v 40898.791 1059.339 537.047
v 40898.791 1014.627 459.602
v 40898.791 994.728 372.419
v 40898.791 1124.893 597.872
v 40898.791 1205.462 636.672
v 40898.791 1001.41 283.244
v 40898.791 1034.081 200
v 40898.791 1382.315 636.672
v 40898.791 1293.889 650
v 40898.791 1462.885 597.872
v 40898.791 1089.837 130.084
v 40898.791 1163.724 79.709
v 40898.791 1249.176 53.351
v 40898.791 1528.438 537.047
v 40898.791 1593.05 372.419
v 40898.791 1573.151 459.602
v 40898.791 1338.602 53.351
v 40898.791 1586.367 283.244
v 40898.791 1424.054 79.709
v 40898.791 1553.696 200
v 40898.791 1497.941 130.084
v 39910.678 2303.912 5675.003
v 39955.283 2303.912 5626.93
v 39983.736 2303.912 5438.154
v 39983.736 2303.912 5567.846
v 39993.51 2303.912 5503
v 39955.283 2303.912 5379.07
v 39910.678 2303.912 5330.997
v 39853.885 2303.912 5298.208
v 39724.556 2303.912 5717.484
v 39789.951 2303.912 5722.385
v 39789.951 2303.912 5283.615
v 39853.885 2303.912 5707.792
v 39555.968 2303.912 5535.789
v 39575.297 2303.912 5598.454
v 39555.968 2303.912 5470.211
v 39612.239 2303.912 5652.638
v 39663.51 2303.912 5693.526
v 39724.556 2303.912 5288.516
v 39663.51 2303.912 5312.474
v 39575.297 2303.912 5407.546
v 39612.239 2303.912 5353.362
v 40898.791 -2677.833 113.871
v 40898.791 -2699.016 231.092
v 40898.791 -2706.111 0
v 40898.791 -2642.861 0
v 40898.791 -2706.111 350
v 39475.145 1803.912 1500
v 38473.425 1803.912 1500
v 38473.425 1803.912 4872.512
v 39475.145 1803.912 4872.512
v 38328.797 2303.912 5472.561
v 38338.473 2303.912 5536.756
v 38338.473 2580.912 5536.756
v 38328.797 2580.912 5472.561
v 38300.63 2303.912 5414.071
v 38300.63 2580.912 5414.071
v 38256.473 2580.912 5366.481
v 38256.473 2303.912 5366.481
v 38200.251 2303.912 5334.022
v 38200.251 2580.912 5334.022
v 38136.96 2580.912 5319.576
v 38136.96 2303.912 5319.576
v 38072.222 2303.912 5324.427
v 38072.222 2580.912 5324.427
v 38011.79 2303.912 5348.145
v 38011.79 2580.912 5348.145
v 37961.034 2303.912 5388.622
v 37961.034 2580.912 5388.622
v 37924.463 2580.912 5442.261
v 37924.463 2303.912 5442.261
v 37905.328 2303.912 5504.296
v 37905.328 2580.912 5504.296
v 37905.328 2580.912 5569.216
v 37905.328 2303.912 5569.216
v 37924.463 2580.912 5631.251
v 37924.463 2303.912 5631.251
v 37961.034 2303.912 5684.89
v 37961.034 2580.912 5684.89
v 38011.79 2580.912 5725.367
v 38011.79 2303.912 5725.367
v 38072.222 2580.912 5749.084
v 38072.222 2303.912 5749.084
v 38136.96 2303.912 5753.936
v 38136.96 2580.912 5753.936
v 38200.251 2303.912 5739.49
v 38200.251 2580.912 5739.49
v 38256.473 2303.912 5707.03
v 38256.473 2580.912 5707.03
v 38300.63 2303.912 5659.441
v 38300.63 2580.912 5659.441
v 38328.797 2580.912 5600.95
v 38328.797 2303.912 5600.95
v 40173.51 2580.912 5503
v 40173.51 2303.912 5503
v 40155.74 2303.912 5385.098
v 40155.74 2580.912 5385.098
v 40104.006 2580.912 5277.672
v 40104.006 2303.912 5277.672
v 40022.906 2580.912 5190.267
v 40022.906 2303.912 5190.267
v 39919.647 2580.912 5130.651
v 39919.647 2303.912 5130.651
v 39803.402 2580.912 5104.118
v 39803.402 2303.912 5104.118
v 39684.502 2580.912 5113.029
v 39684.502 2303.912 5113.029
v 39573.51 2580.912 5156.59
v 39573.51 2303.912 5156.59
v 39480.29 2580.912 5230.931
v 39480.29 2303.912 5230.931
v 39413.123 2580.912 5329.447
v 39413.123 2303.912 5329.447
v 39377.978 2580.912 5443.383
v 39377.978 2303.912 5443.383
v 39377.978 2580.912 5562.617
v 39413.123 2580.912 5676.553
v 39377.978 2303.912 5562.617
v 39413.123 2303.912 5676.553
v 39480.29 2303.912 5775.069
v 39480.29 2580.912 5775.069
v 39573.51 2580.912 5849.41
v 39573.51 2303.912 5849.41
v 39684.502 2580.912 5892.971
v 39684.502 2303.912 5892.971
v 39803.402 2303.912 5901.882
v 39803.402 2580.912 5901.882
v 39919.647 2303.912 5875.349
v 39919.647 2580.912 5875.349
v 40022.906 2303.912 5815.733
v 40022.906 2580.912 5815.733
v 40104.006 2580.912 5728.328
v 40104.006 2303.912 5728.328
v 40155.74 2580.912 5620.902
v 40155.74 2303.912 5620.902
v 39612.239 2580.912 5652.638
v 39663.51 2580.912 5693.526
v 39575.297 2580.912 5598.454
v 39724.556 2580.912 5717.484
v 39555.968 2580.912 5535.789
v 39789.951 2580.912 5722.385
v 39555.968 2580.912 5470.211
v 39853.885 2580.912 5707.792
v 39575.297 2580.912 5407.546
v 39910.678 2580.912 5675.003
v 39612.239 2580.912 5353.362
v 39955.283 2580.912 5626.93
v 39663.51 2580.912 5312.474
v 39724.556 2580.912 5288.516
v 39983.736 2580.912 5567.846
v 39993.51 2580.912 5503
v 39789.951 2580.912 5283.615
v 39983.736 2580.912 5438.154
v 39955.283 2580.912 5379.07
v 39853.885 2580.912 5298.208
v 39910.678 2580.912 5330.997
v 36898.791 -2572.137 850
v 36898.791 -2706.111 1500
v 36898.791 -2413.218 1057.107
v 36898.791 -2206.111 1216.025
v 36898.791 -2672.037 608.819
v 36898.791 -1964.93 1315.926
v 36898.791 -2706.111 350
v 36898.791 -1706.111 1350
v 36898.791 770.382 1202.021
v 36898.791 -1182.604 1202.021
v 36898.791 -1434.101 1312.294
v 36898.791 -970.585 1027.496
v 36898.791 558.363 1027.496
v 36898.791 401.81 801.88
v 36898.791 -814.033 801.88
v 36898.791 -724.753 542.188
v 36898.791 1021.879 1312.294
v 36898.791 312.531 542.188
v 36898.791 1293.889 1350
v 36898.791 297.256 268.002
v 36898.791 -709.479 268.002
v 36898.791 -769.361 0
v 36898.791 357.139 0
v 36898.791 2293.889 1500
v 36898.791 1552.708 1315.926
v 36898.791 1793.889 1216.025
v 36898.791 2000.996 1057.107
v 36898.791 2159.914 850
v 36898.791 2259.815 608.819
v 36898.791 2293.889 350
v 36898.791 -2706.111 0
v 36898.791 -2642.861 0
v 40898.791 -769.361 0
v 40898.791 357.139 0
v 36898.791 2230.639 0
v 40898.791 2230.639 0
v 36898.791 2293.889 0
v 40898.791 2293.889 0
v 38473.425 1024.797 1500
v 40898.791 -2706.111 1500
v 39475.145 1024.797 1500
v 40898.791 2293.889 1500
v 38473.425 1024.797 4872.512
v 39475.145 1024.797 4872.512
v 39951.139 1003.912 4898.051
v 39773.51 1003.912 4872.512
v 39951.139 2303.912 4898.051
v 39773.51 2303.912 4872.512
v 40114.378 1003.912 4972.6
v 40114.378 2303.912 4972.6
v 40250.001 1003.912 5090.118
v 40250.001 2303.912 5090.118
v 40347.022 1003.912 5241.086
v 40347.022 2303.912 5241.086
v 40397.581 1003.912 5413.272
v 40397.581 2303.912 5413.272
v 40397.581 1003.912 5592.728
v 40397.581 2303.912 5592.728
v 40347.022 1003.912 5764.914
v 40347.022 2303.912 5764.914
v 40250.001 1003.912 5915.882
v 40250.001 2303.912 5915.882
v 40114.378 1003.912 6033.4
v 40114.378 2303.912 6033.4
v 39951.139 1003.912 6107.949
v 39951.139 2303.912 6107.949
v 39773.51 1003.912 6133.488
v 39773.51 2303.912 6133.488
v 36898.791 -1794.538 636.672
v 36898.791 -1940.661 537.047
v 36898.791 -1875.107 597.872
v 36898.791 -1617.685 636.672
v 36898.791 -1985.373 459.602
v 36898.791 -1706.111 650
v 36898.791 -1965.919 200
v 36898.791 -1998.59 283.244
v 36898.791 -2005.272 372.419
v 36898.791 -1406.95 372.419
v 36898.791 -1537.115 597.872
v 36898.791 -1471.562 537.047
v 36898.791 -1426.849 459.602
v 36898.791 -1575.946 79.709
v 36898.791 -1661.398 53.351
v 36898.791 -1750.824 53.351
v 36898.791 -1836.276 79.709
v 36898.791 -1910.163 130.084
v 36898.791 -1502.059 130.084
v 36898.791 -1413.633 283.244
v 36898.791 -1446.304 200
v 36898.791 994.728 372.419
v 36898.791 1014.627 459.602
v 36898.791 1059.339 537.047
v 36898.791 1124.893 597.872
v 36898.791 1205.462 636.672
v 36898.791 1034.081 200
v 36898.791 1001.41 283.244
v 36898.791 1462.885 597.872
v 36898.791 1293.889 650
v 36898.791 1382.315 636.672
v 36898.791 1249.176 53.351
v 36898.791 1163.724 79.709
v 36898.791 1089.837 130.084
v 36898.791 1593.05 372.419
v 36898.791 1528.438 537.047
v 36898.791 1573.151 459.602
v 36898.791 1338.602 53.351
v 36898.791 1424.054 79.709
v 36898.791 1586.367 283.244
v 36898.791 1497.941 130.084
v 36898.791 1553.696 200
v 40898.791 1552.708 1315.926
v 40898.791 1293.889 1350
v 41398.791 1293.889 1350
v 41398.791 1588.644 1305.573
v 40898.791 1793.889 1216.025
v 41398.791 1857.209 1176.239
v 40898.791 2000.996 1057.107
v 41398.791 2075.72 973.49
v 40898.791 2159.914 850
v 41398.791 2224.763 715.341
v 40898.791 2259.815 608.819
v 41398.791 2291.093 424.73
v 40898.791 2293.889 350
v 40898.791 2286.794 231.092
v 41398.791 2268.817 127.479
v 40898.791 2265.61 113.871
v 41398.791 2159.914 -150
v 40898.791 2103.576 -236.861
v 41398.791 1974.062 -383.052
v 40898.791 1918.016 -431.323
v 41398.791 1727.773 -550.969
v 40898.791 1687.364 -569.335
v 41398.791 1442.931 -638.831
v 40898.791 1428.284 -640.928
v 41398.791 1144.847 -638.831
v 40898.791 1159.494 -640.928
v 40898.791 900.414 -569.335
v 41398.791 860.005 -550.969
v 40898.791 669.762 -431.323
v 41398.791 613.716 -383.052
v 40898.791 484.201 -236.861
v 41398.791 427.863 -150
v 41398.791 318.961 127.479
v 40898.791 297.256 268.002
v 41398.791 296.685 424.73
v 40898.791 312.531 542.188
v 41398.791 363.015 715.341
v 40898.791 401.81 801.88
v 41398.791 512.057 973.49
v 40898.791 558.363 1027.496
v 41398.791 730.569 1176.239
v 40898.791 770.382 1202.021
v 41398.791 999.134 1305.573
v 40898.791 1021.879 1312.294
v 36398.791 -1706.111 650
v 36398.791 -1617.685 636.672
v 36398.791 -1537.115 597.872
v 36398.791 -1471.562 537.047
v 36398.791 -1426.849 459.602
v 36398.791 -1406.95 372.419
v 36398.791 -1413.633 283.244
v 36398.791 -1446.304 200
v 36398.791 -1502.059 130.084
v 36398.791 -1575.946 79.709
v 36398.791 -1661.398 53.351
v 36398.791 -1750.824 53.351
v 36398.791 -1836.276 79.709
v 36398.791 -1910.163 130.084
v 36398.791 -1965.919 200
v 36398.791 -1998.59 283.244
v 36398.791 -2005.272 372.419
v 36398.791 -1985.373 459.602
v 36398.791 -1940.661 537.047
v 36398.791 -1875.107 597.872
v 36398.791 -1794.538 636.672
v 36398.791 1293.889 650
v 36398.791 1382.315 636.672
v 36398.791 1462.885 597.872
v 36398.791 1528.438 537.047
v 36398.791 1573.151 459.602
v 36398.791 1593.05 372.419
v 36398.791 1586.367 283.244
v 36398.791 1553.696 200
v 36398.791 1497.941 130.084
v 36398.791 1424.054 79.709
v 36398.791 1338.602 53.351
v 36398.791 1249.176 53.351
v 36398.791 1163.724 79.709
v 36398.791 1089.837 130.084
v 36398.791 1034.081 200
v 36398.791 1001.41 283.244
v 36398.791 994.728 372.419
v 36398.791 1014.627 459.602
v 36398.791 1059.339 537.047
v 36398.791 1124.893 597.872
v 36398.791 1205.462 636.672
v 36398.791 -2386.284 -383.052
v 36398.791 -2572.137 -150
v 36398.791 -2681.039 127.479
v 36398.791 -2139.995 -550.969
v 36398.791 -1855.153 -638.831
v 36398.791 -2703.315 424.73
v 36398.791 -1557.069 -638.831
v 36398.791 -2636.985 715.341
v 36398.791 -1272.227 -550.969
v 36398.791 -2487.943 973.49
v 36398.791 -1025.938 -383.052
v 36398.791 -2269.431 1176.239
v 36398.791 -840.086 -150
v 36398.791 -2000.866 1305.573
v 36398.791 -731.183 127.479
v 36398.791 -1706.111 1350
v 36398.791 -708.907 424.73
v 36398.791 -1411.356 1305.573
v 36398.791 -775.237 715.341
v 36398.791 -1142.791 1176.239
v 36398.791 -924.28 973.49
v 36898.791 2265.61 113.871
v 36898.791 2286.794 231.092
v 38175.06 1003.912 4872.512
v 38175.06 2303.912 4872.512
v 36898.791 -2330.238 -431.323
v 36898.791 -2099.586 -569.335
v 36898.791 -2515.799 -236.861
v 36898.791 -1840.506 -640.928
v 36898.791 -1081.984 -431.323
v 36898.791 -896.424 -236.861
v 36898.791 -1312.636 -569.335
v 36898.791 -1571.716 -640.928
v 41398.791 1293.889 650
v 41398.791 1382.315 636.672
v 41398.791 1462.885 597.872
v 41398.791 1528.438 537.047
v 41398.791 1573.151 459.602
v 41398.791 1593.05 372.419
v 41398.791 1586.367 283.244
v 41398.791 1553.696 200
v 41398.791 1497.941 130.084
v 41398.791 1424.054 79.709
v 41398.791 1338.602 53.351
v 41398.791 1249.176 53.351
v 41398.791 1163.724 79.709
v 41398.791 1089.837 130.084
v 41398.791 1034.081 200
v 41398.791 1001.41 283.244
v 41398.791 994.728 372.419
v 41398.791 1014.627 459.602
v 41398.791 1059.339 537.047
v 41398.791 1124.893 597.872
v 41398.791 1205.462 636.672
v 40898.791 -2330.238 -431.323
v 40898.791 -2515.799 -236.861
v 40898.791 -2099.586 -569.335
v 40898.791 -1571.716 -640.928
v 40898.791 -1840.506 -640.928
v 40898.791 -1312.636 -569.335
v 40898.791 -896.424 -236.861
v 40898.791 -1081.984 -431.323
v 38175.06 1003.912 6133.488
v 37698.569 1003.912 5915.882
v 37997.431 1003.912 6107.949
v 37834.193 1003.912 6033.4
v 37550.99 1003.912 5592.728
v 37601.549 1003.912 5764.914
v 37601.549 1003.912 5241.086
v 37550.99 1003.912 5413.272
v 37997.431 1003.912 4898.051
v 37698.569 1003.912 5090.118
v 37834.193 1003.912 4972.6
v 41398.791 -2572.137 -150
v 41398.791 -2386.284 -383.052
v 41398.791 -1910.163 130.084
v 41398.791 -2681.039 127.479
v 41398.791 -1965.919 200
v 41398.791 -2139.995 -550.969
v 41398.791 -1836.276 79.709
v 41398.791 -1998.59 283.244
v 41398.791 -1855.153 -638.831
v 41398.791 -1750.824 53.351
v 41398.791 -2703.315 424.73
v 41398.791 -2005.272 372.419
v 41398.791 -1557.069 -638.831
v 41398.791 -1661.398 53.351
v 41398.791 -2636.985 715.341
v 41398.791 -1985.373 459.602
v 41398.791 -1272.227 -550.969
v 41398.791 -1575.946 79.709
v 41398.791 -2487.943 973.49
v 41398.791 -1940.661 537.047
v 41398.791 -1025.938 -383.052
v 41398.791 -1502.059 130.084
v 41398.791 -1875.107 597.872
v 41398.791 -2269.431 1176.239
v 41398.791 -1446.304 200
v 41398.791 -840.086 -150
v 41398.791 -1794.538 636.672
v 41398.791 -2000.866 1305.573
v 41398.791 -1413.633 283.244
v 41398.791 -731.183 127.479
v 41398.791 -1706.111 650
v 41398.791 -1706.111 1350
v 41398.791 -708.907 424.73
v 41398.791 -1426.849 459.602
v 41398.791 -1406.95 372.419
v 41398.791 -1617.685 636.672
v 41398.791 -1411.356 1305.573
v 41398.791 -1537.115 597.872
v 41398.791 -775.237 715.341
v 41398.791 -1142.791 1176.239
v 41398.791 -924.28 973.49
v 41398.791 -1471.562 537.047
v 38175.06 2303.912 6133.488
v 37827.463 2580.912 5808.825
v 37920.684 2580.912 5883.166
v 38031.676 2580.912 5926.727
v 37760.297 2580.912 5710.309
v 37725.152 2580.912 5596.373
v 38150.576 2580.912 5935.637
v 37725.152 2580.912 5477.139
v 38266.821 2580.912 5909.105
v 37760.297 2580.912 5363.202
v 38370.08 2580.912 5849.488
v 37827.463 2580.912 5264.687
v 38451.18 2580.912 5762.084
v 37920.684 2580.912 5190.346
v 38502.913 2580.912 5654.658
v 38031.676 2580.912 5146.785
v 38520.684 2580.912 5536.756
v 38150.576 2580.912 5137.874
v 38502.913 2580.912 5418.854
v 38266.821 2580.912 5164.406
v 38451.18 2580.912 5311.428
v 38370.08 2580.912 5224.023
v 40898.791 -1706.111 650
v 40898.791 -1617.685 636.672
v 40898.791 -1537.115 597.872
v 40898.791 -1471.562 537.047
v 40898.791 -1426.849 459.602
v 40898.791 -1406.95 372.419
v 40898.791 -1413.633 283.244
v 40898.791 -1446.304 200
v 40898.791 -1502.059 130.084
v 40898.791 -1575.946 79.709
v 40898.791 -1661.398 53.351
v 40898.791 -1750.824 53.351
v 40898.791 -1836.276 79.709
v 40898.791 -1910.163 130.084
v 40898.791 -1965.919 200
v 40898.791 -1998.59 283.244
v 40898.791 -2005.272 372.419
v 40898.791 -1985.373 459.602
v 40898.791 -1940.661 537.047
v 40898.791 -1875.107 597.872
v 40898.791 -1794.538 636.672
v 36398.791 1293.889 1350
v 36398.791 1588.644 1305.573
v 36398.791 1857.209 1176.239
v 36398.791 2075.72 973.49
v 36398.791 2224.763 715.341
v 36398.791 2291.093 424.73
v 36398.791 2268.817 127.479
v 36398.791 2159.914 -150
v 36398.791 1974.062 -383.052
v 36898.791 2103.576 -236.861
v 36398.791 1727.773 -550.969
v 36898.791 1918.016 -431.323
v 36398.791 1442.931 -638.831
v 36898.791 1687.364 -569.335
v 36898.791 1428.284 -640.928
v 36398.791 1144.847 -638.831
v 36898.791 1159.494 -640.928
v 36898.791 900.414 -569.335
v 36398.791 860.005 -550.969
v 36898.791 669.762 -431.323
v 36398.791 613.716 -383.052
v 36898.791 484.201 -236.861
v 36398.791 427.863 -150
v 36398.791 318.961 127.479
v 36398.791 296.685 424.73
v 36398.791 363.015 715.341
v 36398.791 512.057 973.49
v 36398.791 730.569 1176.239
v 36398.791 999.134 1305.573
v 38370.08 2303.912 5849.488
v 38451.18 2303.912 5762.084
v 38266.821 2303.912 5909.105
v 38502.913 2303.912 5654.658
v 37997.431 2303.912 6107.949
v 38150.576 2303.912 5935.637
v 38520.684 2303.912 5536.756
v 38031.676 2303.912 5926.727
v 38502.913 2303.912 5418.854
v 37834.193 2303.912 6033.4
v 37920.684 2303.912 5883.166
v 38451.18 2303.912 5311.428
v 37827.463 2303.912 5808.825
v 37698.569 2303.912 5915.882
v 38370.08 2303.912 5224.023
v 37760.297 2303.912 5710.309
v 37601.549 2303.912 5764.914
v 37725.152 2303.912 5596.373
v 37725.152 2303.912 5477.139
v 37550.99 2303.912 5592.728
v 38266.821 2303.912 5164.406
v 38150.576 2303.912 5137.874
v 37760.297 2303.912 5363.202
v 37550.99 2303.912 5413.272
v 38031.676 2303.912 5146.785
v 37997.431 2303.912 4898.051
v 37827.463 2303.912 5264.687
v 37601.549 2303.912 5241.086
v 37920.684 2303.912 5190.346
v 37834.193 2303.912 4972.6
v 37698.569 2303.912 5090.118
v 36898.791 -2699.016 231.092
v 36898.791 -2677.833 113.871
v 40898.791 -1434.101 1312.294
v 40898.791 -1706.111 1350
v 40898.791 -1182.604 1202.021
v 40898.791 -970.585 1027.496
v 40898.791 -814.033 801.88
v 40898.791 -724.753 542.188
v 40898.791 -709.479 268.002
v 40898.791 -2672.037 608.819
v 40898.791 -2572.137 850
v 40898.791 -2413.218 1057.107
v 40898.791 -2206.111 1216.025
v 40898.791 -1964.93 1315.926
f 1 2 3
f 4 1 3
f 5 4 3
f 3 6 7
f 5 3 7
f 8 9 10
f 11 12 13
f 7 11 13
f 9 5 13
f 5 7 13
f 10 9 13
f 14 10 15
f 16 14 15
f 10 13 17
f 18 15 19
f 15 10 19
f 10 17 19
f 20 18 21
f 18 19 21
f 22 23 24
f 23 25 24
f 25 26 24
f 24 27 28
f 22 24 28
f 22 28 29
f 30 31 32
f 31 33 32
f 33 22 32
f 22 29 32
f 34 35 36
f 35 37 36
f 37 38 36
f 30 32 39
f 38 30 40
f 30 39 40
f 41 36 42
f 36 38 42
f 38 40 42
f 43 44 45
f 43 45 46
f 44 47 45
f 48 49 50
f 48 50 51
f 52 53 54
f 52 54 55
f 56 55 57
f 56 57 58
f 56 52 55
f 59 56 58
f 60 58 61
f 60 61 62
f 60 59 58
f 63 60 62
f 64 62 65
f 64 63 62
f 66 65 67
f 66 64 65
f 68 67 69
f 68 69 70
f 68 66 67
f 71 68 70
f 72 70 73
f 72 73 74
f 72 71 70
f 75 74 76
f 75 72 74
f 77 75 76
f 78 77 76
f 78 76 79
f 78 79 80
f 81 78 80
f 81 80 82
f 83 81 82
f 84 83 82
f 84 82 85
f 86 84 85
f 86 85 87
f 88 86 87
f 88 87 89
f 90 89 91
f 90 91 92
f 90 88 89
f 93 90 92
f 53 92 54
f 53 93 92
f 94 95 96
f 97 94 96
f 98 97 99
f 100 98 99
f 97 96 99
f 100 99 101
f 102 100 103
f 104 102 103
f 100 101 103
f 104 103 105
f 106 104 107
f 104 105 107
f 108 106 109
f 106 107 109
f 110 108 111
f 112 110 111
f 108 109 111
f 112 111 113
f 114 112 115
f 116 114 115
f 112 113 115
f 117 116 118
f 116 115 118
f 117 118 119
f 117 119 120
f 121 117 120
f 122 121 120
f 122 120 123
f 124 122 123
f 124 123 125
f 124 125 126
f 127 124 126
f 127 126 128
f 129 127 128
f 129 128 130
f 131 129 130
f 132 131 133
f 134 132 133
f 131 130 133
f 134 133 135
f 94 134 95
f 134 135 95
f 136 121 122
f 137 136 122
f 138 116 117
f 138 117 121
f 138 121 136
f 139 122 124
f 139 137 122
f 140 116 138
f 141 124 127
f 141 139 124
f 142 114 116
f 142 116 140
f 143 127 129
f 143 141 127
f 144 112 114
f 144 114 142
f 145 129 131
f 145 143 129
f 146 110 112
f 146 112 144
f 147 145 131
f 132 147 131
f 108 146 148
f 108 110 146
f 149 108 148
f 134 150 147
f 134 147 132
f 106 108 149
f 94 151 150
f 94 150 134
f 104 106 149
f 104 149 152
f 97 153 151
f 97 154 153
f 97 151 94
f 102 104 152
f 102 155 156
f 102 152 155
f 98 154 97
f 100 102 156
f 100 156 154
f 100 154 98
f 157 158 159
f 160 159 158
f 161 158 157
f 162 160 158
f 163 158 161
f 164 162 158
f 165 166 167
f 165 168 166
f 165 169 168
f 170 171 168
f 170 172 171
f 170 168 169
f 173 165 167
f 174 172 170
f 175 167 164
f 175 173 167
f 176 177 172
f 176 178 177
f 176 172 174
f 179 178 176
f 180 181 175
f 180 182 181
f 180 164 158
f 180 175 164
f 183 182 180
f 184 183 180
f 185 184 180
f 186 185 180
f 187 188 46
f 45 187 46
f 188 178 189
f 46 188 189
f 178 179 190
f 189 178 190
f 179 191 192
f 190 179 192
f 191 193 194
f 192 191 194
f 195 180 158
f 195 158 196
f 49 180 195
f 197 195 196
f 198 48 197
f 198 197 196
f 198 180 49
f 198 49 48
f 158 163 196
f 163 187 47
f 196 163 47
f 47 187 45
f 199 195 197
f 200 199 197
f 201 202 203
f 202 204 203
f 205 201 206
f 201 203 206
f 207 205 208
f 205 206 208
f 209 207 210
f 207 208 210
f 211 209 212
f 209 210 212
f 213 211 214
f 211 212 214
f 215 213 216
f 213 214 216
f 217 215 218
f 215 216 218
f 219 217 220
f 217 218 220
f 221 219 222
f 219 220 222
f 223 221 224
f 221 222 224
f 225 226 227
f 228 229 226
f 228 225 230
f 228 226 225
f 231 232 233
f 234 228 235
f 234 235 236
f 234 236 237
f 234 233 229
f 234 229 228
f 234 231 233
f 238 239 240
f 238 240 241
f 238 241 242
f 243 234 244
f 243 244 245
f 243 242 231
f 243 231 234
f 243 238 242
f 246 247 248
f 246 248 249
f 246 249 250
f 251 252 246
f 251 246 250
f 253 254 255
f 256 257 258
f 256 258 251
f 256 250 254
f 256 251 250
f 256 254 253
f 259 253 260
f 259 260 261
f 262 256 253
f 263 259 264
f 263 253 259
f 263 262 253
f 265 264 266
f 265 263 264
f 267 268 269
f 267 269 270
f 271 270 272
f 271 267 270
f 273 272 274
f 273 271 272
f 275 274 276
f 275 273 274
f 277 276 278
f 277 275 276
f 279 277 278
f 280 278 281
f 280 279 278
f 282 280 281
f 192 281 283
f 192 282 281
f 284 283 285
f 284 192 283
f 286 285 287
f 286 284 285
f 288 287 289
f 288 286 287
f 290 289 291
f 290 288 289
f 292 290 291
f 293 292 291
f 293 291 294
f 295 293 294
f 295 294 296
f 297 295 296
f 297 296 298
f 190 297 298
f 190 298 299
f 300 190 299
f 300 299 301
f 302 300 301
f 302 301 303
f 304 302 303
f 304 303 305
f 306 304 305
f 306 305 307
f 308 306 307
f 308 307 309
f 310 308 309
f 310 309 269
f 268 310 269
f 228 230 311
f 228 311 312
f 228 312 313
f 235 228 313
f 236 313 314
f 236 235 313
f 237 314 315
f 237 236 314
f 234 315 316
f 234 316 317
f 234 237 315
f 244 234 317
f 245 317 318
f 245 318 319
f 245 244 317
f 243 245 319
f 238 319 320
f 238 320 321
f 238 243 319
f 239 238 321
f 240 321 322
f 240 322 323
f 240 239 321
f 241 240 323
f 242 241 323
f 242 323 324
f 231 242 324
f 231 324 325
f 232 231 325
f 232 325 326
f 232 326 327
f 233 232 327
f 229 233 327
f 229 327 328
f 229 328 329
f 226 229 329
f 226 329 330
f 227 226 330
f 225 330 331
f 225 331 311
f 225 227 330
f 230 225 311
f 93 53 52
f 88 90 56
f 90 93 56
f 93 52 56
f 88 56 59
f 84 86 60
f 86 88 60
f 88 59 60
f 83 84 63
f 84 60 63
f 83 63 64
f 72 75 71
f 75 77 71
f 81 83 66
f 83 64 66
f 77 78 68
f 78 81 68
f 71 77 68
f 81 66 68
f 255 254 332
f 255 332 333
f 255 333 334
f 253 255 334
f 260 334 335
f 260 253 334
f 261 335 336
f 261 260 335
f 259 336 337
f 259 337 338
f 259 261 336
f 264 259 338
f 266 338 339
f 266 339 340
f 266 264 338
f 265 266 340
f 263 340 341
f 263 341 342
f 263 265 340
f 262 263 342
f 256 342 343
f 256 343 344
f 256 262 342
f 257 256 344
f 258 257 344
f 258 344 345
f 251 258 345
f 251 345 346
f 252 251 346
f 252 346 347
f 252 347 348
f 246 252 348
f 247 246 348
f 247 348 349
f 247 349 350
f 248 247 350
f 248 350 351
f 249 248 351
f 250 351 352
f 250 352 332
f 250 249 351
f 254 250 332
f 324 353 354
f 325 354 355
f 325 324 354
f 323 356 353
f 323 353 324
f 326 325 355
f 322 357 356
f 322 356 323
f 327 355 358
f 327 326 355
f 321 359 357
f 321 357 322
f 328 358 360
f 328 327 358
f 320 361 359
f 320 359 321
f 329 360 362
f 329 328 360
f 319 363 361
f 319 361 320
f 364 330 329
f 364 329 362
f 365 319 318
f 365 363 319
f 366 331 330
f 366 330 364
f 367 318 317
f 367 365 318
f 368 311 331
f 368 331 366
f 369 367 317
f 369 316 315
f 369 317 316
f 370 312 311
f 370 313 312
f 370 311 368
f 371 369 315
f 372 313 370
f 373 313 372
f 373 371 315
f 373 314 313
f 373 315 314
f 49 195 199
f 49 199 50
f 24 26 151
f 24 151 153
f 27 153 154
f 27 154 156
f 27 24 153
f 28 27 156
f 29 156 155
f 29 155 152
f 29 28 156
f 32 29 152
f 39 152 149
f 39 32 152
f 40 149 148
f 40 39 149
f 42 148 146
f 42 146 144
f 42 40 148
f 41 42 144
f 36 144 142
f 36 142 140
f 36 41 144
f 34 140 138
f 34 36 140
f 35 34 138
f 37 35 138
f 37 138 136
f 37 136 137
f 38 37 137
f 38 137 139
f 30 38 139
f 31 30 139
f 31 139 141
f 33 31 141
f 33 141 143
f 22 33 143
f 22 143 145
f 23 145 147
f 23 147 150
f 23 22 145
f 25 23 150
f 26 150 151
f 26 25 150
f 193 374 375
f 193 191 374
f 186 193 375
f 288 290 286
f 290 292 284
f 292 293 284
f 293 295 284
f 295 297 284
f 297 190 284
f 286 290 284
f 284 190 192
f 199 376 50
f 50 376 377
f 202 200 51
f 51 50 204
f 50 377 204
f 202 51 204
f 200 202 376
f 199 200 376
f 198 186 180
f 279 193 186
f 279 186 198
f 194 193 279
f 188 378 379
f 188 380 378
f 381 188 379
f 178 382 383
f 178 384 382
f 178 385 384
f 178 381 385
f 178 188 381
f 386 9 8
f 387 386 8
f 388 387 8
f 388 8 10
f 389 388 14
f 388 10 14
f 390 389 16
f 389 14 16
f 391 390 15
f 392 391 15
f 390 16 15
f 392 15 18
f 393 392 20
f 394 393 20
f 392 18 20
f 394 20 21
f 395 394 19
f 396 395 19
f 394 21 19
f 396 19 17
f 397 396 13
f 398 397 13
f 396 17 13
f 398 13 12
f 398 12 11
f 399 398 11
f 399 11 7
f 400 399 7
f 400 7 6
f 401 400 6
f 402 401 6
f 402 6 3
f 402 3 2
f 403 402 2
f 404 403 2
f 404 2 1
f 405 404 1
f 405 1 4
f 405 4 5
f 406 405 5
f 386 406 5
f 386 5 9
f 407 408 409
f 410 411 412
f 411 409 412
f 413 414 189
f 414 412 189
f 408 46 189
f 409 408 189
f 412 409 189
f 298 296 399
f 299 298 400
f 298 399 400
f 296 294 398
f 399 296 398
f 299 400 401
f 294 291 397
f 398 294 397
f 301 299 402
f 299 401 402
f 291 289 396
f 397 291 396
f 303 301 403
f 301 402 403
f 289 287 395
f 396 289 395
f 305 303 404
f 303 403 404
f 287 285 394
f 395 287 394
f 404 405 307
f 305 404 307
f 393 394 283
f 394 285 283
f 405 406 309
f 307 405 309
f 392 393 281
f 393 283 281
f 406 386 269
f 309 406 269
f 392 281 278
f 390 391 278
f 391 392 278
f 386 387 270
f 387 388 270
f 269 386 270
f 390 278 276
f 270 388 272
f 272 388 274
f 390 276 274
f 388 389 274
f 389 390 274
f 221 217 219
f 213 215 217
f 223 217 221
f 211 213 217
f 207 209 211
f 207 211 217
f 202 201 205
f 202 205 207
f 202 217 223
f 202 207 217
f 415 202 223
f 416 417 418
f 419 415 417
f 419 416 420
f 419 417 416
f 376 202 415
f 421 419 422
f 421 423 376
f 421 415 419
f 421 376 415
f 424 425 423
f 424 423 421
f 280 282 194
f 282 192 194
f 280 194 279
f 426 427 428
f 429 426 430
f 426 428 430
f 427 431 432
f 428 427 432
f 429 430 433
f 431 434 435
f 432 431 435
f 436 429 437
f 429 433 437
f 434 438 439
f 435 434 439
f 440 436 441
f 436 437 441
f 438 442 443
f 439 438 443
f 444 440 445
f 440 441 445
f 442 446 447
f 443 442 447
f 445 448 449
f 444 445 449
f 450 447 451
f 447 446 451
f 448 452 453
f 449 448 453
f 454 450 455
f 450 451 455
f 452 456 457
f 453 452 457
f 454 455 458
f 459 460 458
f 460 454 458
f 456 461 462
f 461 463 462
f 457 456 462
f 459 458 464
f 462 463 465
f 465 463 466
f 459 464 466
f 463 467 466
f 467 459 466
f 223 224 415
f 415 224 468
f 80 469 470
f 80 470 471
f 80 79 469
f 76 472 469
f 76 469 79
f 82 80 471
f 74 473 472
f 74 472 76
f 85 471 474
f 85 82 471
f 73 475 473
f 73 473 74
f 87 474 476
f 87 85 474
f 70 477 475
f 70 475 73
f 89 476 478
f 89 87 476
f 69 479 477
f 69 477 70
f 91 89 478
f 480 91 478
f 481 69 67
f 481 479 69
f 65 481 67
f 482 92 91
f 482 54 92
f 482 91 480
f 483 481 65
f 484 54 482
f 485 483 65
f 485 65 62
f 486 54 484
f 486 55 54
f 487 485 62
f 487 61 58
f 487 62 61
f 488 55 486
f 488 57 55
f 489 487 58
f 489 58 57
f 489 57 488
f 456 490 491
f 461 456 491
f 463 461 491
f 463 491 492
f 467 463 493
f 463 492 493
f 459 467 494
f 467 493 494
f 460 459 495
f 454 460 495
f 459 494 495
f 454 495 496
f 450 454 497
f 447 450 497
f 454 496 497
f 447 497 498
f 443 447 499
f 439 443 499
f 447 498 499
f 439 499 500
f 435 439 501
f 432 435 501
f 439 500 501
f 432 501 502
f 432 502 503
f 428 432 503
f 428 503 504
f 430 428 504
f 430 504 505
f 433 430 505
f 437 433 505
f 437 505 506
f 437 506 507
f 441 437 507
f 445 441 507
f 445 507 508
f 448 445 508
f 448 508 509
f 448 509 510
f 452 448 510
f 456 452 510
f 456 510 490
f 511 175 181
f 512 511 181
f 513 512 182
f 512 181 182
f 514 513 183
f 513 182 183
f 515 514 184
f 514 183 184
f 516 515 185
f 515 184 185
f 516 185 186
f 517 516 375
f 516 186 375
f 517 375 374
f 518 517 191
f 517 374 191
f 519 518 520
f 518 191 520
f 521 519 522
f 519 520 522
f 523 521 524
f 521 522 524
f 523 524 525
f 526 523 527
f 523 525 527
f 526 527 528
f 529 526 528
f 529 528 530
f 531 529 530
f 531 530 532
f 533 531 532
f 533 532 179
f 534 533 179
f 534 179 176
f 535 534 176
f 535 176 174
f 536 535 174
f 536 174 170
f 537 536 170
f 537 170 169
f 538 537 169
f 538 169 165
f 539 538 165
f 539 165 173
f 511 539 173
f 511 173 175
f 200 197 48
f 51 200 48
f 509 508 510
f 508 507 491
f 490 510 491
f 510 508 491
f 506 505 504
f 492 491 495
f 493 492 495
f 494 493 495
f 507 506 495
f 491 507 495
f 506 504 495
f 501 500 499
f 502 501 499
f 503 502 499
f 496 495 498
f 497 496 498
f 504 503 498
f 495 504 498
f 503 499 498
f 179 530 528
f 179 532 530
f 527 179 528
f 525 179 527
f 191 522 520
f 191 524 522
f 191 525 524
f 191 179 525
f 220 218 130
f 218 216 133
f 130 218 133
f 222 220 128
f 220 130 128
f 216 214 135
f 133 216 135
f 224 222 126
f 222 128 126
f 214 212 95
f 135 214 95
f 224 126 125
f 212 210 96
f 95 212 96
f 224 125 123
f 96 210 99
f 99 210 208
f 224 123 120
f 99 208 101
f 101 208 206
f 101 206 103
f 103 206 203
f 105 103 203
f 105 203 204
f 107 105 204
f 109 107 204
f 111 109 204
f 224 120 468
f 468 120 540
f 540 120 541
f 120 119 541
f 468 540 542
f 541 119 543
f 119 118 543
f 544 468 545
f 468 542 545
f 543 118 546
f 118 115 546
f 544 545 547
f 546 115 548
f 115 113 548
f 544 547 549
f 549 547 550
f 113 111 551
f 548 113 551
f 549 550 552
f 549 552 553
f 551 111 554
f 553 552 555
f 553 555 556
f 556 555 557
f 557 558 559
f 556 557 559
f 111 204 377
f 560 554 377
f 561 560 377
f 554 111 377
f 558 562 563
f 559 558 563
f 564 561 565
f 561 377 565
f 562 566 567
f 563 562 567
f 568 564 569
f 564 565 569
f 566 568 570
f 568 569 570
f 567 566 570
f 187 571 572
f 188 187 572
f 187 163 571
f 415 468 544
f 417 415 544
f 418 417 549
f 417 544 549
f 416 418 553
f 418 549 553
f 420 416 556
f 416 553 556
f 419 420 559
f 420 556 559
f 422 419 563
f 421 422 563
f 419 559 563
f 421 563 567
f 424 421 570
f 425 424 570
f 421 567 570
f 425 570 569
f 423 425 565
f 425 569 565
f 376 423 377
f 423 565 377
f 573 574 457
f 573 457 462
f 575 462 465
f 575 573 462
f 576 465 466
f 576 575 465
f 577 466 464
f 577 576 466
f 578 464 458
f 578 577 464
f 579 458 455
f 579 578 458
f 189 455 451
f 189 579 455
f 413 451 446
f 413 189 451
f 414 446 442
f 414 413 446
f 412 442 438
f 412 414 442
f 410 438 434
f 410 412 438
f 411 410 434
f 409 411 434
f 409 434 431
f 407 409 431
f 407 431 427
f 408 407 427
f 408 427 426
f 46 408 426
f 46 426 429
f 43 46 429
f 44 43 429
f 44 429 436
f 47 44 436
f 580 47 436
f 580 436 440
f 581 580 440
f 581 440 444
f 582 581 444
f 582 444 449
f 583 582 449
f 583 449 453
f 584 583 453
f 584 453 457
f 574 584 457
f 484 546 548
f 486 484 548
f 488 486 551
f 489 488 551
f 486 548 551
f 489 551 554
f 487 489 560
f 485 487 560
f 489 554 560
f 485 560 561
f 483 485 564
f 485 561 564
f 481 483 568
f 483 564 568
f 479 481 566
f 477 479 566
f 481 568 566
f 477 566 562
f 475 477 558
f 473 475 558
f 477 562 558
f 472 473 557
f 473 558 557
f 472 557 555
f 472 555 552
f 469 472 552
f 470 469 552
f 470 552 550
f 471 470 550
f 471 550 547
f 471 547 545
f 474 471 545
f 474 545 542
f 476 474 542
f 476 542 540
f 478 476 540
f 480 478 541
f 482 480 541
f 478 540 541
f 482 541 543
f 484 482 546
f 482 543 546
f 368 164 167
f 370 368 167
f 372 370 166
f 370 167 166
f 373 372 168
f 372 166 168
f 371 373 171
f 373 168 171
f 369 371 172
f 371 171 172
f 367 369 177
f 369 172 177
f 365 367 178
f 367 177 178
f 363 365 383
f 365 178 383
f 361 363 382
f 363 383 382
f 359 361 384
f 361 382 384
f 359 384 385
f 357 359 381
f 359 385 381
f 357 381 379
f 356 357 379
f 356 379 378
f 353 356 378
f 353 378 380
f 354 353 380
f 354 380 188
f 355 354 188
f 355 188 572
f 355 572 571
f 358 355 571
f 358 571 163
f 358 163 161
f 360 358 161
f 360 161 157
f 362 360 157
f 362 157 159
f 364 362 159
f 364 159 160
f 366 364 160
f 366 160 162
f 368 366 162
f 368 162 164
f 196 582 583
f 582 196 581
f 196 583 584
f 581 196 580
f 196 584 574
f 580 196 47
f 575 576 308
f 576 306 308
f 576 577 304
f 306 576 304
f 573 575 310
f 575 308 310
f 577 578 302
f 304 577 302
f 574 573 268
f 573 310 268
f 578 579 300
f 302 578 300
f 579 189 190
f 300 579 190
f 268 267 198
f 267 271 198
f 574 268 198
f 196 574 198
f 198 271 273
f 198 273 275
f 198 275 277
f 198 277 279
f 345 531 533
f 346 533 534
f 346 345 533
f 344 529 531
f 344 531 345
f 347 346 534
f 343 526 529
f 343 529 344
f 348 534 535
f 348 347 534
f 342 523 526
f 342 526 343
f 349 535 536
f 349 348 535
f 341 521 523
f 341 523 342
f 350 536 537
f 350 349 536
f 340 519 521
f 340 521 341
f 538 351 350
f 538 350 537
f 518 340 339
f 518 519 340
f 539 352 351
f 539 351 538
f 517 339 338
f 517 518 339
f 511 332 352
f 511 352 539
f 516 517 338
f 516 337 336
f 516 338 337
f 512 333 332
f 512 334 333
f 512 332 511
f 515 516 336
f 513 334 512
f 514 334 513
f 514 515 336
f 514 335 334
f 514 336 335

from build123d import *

# Parameters (mm, degrees)
SKETCH2_W                = 4000
SKETCH2_H                = 5000
BOSS_EXTRUDE1_DEPTH      = 1500
SKETCH3_R                = 1000
SKETCH3_R_2              = 300
BOSS_EXTRUDE3_DEPTH      = 500
BOSS_EXTRUDE3_DEPTH_BACK = 4500
SKETCH5_W                = 4000
SKETCH5_H                = 5000
CUT_EXTRUDE1_DEPTH       = 2265
SKETCH6_W                = 1001.71973897
SKETCH6_H                = 779.115352533
BOSS_EXTRUDE4_DEPTH      = 4003
BOSS_EXTRUDE5_DEPTH      = 500
BOSS_EXTRUDE5_DEPTH_BACK = 800
SKETCH8_R                = 400
SKETCH8_R_2              = 217.789034684
SKETCH8_R_3              = 220
BOSS_EXTRUDE6_DEPTH      = 277


with BuildPart() as part:
    # Sketch2 → Boss-Extrude1 (new body)
    with BuildSketch(Plane.XY):
        with Locations((38898.791453363, -206.111128518)):
            Rectangle(SKETCH2_W, SKETCH2_H)
    extrude(amount=BOSS_EXTRUDE1_DEPTH)

    # Sketch3 → Boss-Extrude3 (add, two sides)
    with BuildSketch(Plane.ZY.offset(-36898.791453363)) as boss_extrude3_sk:
        with Locations((350, 1293.888871482)):
            Circle(SKETCH3_R)
        with Locations((350, 1293.888871482)):
            Circle(SKETCH3_R_2, mode=Mode.SUBTRACT)
        with Locations((350, -1706.111128518)):
            Circle(SKETCH3_R)
        with Locations((350, -1706.111128518)):
            Circle(SKETCH3_R_2, mode=Mode.SUBTRACT)
    extrude(amount=BOSS_EXTRUDE3_DEPTH)
    extrude(boss_extrude3_sk.sketch, amount=-BOSS_EXTRUDE3_DEPTH_BACK)

    # Sketch5 → Cut-Extrude1 (cut)
    with BuildSketch(Plane(origin=(0, 0, 0), x_dir=(-1, 0, 0), z_dir=(0, 0, -1))):
        with Locations((-38898.791453363, -206.111128518)):
            Rectangle(SKETCH5_W, SKETCH5_H)
    extrude(amount=CUT_EXTRUDE1_DEPTH, mode=Mode.SUBTRACT)

    # Sketch6 → Boss-Extrude4 (add)
    with BuildSketch(Plane.XY.offset(1500)):
        with Locations((38974.285343741, 1414.354452783)):
            Rectangle(SKETCH6_W, SKETCH6_H)
    extrude(amount=BOSS_EXTRUDE4_DEPTH)

    # Sketch7 → Boss-Extrude5 (add, two sides)
    with BuildSketch(Plane(origin=(0, 1803.912129049, 0), x_dir=(1, 0, 0), z_dir=(0, 1, 0))) as boss_extrude5_sk:
        with BuildLine():
            Line((38175.060305498, -4872.512277543), (39773.510381983, -4872.512277543))
            ThreePointArc((39773.510381983, -4872.512277543), (40403.998104441, -5503), (39773.510381983, -6133.487722457))
            Line((39773.510381983, -6133.487722457), (38175.060305498, -6133.487722457))
            ThreePointArc((38175.060305498, -6133.487722457), (37544.572583041, -5503), (38175.060305498, -4872.512277543))
        make_face()
    extrude(amount=BOSS_EXTRUDE5_DEPTH)
    extrude(boss_extrude5_sk.sketch, amount=-BOSS_EXTRUDE5_DEPTH_BACK)

    # Sketch8 → Boss-Extrude6 (add)
    with BuildSketch(Plane(origin=(0, 2303.912129049, 0), x_dir=(1, 0, 0), z_dir=(0, 1, 0))):
        with Locations((38120.684189959, -5536.755767572)):
            Circle(SKETCH8_R)
        with Locations((38120.684189959, -5536.755767572)):
            Circle(SKETCH8_R_2, mode=Mode.SUBTRACT)
        with Locations((39773.510381983, -5503)):
            Circle(SKETCH8_R)
        with Locations((39773.510381983, -5503)):
            Circle(SKETCH8_R_3, mode=Mode.SUBTRACT)
    extrude(amount=BOSS_EXTRUDE6_DEPTH)


solid = part.part
